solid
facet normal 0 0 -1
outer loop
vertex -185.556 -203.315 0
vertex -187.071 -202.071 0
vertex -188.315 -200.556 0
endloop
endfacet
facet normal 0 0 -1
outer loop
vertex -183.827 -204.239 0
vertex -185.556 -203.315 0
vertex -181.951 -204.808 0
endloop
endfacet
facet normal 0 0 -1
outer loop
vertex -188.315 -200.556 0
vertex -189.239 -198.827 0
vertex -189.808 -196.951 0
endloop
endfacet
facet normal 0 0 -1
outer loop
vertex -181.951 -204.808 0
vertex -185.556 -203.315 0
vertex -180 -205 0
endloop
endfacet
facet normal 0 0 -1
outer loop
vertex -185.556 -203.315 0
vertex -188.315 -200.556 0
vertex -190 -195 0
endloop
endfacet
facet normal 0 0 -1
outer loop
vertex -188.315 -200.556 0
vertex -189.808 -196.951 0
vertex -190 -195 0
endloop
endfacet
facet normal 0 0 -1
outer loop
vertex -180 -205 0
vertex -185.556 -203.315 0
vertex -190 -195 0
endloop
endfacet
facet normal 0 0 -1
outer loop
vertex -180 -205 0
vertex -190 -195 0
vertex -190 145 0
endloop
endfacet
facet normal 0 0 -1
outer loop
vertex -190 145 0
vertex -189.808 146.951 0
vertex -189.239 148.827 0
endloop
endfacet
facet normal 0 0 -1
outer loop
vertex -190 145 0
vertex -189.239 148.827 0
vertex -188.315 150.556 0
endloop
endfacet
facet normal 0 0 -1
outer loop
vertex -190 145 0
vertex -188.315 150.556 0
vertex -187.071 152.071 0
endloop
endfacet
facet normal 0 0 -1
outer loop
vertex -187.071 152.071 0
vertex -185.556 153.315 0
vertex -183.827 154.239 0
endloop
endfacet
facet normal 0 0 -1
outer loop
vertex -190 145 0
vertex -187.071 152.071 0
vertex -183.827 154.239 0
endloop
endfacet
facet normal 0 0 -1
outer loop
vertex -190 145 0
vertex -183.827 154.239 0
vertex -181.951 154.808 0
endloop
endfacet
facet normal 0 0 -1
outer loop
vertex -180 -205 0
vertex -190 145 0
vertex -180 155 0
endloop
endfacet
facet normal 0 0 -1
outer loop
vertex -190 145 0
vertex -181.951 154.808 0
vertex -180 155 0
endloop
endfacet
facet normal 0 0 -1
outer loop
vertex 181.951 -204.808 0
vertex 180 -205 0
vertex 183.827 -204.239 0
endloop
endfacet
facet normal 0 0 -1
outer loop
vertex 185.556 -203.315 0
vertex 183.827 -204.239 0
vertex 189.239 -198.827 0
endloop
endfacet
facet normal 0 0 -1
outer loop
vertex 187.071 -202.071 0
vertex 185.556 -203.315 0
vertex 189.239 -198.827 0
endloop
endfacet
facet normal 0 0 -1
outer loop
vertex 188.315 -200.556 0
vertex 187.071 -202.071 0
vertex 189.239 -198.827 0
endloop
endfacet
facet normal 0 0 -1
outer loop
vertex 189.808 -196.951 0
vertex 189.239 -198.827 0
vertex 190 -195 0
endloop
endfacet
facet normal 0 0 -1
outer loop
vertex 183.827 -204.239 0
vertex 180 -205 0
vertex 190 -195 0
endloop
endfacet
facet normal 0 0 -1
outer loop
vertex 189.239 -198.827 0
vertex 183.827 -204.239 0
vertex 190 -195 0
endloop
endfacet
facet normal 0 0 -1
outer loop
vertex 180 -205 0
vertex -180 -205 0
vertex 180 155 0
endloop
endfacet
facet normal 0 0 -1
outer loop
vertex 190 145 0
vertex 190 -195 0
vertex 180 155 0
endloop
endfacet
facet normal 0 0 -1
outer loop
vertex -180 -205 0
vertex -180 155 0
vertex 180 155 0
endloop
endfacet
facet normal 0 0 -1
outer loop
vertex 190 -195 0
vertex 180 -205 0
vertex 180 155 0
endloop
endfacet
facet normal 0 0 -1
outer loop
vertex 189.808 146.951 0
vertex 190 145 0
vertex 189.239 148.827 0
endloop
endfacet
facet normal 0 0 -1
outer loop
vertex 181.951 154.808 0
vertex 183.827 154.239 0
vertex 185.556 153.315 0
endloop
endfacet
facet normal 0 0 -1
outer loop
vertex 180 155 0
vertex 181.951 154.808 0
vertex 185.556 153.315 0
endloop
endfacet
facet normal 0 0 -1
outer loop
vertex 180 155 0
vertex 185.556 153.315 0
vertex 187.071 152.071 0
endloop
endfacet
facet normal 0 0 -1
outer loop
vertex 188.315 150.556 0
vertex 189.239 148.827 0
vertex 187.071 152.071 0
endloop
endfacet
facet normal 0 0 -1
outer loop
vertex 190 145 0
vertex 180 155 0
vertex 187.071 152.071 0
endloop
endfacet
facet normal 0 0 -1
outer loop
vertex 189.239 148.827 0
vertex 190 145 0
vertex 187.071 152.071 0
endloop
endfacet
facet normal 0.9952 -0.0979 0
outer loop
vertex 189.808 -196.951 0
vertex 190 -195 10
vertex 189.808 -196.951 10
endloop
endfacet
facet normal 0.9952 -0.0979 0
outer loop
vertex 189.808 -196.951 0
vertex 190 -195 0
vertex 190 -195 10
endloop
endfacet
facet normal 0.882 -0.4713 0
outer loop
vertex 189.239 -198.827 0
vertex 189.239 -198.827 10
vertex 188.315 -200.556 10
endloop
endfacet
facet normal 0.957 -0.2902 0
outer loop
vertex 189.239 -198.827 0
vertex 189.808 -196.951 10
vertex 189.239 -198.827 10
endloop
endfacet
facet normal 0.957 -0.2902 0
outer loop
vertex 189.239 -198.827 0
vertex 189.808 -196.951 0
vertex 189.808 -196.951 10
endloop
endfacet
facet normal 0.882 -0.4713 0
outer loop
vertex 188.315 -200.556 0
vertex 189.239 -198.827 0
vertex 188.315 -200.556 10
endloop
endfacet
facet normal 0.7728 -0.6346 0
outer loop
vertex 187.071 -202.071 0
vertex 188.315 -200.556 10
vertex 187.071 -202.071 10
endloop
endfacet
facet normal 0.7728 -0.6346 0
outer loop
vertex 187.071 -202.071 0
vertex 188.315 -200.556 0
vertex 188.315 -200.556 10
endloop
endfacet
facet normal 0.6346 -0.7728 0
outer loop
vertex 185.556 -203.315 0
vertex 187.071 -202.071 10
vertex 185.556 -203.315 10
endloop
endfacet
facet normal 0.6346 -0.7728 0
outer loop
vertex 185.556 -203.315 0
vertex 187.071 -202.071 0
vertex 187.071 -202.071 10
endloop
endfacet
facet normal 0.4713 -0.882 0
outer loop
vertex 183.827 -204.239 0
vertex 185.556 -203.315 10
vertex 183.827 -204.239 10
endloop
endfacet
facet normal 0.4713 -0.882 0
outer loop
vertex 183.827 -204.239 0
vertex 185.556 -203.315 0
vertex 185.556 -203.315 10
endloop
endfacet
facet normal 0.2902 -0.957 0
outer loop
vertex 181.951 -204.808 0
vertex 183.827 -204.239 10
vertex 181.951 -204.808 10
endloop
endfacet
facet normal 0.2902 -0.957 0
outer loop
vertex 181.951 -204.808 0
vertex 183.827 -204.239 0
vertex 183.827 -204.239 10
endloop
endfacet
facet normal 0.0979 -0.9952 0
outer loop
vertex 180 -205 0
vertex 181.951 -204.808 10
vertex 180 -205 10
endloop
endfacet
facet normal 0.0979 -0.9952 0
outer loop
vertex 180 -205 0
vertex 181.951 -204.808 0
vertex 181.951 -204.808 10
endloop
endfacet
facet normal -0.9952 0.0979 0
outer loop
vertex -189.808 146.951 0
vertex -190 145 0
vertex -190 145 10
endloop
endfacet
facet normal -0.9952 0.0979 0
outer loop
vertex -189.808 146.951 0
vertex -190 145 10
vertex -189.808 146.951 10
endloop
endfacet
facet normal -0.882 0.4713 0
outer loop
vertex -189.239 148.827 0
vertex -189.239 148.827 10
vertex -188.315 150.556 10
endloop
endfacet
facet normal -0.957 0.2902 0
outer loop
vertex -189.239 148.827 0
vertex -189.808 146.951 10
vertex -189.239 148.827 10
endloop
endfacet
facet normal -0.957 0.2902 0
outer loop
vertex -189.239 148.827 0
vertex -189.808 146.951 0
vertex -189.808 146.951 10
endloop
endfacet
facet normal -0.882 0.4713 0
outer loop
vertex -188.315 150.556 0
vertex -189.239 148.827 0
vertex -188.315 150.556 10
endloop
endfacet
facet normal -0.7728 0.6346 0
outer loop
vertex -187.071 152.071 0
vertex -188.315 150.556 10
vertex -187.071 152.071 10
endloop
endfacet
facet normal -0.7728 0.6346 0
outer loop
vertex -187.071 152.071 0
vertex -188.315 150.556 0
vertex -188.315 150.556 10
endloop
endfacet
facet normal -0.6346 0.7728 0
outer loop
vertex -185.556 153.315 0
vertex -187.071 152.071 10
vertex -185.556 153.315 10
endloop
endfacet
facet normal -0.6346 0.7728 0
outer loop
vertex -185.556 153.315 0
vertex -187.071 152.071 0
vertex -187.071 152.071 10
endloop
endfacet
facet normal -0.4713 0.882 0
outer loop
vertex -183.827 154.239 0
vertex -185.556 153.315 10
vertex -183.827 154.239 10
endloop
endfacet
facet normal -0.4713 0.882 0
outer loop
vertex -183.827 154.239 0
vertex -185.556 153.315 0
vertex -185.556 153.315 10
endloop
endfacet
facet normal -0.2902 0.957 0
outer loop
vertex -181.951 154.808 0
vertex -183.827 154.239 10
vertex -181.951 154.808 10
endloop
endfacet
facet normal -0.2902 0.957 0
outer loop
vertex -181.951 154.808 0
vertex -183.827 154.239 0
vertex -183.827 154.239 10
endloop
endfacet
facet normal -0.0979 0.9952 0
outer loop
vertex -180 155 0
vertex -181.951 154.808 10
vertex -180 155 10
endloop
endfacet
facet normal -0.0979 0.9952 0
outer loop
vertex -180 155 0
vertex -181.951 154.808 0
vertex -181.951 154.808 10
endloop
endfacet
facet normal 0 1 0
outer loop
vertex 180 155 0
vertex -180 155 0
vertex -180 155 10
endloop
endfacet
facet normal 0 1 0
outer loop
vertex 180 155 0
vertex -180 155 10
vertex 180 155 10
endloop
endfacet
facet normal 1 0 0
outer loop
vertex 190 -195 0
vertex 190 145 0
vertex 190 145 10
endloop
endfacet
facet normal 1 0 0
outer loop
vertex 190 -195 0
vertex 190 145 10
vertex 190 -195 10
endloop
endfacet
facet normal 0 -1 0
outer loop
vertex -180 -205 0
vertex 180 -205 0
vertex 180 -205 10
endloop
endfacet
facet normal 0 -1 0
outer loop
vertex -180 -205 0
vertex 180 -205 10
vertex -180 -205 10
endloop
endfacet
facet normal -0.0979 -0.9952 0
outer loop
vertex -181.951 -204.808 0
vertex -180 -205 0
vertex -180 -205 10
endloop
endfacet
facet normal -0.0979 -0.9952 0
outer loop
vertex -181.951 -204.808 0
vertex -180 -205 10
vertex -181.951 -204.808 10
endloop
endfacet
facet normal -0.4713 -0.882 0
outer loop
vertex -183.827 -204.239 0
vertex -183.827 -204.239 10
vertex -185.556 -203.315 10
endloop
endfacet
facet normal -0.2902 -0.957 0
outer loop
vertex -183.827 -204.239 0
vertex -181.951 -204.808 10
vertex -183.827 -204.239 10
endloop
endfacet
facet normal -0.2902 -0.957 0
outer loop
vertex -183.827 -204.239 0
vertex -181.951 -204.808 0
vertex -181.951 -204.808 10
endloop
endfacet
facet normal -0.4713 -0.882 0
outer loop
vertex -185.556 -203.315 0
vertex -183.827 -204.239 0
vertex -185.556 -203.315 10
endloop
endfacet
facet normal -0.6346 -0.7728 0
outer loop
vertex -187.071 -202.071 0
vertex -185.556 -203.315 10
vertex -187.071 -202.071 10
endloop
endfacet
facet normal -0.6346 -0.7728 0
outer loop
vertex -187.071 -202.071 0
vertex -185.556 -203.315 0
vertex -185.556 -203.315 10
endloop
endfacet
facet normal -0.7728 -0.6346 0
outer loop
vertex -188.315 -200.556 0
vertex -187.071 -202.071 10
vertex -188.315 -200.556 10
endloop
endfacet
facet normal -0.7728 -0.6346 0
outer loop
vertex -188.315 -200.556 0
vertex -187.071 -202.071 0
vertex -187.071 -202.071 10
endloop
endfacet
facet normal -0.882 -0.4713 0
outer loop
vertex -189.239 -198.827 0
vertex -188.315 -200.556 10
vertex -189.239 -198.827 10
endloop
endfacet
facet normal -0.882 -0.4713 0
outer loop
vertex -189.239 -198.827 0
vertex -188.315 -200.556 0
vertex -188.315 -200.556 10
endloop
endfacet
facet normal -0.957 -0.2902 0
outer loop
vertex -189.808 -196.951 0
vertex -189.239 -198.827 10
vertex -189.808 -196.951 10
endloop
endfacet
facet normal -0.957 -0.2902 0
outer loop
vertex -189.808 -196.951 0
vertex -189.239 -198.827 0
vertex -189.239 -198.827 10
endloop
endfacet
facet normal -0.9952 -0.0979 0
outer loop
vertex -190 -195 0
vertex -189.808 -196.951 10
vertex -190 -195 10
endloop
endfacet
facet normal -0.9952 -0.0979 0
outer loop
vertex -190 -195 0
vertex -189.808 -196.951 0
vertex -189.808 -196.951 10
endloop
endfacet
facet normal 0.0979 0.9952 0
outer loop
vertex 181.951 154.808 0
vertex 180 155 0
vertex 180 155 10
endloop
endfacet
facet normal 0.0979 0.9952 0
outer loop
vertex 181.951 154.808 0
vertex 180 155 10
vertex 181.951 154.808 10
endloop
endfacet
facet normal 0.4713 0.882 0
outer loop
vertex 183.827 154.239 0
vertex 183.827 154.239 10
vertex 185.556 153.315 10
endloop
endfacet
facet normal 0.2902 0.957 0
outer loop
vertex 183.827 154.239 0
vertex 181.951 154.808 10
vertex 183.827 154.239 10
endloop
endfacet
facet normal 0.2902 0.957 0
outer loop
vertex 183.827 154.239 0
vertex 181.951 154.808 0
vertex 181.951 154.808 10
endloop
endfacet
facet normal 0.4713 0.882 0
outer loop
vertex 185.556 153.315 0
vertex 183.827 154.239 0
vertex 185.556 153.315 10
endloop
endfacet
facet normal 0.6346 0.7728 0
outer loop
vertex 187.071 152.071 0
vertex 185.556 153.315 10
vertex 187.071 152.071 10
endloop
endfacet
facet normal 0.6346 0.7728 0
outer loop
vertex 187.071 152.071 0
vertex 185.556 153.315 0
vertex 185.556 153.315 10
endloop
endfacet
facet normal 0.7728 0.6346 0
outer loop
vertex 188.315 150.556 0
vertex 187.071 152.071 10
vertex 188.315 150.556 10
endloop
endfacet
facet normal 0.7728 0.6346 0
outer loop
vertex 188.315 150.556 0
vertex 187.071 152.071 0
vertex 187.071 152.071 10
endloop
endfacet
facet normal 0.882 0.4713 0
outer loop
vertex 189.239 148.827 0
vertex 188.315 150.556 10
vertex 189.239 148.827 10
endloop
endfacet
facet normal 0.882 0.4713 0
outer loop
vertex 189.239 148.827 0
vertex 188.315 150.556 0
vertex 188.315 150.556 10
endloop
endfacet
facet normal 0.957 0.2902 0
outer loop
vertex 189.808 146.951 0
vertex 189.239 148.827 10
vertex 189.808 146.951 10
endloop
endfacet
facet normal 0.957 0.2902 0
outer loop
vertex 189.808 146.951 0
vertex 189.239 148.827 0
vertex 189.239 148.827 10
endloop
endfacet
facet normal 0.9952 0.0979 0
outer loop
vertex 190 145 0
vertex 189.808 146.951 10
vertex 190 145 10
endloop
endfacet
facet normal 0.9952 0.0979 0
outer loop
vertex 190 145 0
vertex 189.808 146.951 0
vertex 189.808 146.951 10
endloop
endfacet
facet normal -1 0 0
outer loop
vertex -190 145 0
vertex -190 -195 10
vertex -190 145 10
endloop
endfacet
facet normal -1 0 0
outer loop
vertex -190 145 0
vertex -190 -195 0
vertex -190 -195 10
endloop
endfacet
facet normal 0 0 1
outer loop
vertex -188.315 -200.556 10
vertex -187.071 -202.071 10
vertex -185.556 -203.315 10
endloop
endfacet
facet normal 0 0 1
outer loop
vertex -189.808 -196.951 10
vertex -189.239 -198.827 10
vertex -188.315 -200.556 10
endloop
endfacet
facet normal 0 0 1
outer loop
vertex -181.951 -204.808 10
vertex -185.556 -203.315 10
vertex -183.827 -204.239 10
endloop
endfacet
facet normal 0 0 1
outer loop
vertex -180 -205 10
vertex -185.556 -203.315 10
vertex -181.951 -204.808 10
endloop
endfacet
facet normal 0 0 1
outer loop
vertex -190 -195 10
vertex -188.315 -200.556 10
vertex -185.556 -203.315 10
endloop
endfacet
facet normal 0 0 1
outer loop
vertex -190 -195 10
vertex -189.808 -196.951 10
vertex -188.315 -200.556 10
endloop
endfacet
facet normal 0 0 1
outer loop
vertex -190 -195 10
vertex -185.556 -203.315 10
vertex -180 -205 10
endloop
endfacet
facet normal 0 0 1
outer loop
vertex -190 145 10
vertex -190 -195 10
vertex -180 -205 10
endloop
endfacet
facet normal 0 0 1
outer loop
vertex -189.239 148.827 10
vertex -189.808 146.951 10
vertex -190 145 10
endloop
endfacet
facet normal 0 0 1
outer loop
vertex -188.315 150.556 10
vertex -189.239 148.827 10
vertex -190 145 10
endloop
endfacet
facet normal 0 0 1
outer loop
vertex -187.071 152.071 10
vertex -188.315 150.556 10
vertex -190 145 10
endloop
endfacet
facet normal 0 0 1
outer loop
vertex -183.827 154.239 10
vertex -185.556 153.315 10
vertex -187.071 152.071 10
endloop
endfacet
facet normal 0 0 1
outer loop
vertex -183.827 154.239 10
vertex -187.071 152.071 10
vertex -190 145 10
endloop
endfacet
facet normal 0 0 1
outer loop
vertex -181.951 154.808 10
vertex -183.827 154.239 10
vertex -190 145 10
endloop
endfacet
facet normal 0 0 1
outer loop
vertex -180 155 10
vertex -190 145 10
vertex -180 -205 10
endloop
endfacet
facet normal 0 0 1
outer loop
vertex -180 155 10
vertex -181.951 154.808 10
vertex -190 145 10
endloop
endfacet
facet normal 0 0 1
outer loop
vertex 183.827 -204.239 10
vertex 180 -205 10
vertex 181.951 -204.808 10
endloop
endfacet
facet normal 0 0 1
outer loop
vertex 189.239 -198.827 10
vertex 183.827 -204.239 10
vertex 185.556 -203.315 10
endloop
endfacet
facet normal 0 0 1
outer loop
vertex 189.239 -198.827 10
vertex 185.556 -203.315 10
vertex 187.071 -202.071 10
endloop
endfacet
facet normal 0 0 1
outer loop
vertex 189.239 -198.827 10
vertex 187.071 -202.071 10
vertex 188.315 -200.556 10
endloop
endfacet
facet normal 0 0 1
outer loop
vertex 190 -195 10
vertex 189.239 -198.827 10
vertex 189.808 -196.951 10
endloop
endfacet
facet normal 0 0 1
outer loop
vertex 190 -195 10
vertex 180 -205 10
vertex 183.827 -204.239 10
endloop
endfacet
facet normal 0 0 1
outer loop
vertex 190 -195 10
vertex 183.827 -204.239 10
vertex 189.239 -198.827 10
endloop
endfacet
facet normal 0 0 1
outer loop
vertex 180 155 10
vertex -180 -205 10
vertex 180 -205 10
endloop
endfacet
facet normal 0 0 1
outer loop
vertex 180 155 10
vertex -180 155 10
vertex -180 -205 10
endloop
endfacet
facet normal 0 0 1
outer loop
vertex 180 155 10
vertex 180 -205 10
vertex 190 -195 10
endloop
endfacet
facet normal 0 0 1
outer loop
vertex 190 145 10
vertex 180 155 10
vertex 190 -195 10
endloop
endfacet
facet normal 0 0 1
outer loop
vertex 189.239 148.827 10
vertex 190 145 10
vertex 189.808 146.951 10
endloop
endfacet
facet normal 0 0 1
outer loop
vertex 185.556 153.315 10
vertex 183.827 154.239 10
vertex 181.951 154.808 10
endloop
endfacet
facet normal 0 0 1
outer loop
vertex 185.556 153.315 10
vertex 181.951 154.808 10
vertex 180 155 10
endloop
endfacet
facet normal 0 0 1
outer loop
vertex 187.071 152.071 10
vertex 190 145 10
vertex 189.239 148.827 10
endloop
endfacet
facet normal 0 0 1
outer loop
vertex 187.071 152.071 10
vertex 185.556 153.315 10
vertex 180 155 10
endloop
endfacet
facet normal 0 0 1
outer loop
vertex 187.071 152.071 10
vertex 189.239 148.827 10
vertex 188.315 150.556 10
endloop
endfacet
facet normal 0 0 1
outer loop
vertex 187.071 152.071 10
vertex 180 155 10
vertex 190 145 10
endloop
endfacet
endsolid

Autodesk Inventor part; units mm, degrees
ref_plane "YZ Plane" through (0, 0, 0) normal (1, 0, 0) x (0, 1, 0)
ref_plane "XZ Plane" through (0, 0, 0) normal (0, 1, 0) x (-1, 0, 0)
ref_plane "XY Plane" through (0, 0, 0) normal (0, 0, 1) x (1, 0, 0)
ref_plane "Arbeitsebene1" through (0, -25, 0) normal (0, 0, 1) x (1, 0, 0)
sketch "Skizze1" plane through (0, -25, 0) normal (0, 0, 1) x (1, 0, 0)
  arc A0 (-170, 170) -> (-180, 160) centre (-170, 160) ccw projected
  line L0 (-170, 170) -> (170, 170) projected
  arc A1 (180, 160) -> (170, 170) centre (170, 160) ccw projected
  line L1 (180, 160) -> (180, -160) projected
  line L2 (-180, -160) -> (-180, 160) projected
  arc A2 (-180, 180) -> (-190, 170) centre (-180, 170) ccw projected
  line L3 (-190, -170) -> (-190, 170) projected
  arc A3 (-190, -170) -> (-180, -180) centre (-180, -170) ccw projected
  arc A4 (180, -180) -> (190, -170) centre (180, -170) ccw projected
  line L4 (190, 170) -> (190, -170) projected
  arc A5 (190, 170) -> (180, 180) centre (180, 170) ccw projected
  line L5 (180, 165) -> (-180, 165)
  line L6 (-190, 155) -> (-190, -155)
  line L7 (-180, -165) -> (180, -165)
  line L8 (190, -155) -> (190, 155)
  arc A6 (-190, -155) -> (-180, -165) centre (-180, -155) ccw
  arc A7 (-180, 165) -> (-190, 155) centre (-180, 155) ccw
  arc A8 (190, 155) -> (180, 165) centre (180, 155) ccw
  arc A9 (180, -165) -> (190, -155) centre (180, -155) ccw
  arc A10 (170, -170) -> (180, -160) centre (170, -160) ccw projected
  line L9 (170, -170) -> (-170, -170) projected
  arc A11 (-180, -160) -> (-170, -170) centre (-170, -160) ccw projected
  line L10 (-180, 180) -> (180, 180) projected
  line L11 (180, -180) -> (-180, -180) projected
  point P0 (0, 25)
  dimension "d0" = 10
extrude "Extrusion1" add sketch "Skizze1" along normal blind 10
properties part number "SitzflächeGlas" material "Glas"
